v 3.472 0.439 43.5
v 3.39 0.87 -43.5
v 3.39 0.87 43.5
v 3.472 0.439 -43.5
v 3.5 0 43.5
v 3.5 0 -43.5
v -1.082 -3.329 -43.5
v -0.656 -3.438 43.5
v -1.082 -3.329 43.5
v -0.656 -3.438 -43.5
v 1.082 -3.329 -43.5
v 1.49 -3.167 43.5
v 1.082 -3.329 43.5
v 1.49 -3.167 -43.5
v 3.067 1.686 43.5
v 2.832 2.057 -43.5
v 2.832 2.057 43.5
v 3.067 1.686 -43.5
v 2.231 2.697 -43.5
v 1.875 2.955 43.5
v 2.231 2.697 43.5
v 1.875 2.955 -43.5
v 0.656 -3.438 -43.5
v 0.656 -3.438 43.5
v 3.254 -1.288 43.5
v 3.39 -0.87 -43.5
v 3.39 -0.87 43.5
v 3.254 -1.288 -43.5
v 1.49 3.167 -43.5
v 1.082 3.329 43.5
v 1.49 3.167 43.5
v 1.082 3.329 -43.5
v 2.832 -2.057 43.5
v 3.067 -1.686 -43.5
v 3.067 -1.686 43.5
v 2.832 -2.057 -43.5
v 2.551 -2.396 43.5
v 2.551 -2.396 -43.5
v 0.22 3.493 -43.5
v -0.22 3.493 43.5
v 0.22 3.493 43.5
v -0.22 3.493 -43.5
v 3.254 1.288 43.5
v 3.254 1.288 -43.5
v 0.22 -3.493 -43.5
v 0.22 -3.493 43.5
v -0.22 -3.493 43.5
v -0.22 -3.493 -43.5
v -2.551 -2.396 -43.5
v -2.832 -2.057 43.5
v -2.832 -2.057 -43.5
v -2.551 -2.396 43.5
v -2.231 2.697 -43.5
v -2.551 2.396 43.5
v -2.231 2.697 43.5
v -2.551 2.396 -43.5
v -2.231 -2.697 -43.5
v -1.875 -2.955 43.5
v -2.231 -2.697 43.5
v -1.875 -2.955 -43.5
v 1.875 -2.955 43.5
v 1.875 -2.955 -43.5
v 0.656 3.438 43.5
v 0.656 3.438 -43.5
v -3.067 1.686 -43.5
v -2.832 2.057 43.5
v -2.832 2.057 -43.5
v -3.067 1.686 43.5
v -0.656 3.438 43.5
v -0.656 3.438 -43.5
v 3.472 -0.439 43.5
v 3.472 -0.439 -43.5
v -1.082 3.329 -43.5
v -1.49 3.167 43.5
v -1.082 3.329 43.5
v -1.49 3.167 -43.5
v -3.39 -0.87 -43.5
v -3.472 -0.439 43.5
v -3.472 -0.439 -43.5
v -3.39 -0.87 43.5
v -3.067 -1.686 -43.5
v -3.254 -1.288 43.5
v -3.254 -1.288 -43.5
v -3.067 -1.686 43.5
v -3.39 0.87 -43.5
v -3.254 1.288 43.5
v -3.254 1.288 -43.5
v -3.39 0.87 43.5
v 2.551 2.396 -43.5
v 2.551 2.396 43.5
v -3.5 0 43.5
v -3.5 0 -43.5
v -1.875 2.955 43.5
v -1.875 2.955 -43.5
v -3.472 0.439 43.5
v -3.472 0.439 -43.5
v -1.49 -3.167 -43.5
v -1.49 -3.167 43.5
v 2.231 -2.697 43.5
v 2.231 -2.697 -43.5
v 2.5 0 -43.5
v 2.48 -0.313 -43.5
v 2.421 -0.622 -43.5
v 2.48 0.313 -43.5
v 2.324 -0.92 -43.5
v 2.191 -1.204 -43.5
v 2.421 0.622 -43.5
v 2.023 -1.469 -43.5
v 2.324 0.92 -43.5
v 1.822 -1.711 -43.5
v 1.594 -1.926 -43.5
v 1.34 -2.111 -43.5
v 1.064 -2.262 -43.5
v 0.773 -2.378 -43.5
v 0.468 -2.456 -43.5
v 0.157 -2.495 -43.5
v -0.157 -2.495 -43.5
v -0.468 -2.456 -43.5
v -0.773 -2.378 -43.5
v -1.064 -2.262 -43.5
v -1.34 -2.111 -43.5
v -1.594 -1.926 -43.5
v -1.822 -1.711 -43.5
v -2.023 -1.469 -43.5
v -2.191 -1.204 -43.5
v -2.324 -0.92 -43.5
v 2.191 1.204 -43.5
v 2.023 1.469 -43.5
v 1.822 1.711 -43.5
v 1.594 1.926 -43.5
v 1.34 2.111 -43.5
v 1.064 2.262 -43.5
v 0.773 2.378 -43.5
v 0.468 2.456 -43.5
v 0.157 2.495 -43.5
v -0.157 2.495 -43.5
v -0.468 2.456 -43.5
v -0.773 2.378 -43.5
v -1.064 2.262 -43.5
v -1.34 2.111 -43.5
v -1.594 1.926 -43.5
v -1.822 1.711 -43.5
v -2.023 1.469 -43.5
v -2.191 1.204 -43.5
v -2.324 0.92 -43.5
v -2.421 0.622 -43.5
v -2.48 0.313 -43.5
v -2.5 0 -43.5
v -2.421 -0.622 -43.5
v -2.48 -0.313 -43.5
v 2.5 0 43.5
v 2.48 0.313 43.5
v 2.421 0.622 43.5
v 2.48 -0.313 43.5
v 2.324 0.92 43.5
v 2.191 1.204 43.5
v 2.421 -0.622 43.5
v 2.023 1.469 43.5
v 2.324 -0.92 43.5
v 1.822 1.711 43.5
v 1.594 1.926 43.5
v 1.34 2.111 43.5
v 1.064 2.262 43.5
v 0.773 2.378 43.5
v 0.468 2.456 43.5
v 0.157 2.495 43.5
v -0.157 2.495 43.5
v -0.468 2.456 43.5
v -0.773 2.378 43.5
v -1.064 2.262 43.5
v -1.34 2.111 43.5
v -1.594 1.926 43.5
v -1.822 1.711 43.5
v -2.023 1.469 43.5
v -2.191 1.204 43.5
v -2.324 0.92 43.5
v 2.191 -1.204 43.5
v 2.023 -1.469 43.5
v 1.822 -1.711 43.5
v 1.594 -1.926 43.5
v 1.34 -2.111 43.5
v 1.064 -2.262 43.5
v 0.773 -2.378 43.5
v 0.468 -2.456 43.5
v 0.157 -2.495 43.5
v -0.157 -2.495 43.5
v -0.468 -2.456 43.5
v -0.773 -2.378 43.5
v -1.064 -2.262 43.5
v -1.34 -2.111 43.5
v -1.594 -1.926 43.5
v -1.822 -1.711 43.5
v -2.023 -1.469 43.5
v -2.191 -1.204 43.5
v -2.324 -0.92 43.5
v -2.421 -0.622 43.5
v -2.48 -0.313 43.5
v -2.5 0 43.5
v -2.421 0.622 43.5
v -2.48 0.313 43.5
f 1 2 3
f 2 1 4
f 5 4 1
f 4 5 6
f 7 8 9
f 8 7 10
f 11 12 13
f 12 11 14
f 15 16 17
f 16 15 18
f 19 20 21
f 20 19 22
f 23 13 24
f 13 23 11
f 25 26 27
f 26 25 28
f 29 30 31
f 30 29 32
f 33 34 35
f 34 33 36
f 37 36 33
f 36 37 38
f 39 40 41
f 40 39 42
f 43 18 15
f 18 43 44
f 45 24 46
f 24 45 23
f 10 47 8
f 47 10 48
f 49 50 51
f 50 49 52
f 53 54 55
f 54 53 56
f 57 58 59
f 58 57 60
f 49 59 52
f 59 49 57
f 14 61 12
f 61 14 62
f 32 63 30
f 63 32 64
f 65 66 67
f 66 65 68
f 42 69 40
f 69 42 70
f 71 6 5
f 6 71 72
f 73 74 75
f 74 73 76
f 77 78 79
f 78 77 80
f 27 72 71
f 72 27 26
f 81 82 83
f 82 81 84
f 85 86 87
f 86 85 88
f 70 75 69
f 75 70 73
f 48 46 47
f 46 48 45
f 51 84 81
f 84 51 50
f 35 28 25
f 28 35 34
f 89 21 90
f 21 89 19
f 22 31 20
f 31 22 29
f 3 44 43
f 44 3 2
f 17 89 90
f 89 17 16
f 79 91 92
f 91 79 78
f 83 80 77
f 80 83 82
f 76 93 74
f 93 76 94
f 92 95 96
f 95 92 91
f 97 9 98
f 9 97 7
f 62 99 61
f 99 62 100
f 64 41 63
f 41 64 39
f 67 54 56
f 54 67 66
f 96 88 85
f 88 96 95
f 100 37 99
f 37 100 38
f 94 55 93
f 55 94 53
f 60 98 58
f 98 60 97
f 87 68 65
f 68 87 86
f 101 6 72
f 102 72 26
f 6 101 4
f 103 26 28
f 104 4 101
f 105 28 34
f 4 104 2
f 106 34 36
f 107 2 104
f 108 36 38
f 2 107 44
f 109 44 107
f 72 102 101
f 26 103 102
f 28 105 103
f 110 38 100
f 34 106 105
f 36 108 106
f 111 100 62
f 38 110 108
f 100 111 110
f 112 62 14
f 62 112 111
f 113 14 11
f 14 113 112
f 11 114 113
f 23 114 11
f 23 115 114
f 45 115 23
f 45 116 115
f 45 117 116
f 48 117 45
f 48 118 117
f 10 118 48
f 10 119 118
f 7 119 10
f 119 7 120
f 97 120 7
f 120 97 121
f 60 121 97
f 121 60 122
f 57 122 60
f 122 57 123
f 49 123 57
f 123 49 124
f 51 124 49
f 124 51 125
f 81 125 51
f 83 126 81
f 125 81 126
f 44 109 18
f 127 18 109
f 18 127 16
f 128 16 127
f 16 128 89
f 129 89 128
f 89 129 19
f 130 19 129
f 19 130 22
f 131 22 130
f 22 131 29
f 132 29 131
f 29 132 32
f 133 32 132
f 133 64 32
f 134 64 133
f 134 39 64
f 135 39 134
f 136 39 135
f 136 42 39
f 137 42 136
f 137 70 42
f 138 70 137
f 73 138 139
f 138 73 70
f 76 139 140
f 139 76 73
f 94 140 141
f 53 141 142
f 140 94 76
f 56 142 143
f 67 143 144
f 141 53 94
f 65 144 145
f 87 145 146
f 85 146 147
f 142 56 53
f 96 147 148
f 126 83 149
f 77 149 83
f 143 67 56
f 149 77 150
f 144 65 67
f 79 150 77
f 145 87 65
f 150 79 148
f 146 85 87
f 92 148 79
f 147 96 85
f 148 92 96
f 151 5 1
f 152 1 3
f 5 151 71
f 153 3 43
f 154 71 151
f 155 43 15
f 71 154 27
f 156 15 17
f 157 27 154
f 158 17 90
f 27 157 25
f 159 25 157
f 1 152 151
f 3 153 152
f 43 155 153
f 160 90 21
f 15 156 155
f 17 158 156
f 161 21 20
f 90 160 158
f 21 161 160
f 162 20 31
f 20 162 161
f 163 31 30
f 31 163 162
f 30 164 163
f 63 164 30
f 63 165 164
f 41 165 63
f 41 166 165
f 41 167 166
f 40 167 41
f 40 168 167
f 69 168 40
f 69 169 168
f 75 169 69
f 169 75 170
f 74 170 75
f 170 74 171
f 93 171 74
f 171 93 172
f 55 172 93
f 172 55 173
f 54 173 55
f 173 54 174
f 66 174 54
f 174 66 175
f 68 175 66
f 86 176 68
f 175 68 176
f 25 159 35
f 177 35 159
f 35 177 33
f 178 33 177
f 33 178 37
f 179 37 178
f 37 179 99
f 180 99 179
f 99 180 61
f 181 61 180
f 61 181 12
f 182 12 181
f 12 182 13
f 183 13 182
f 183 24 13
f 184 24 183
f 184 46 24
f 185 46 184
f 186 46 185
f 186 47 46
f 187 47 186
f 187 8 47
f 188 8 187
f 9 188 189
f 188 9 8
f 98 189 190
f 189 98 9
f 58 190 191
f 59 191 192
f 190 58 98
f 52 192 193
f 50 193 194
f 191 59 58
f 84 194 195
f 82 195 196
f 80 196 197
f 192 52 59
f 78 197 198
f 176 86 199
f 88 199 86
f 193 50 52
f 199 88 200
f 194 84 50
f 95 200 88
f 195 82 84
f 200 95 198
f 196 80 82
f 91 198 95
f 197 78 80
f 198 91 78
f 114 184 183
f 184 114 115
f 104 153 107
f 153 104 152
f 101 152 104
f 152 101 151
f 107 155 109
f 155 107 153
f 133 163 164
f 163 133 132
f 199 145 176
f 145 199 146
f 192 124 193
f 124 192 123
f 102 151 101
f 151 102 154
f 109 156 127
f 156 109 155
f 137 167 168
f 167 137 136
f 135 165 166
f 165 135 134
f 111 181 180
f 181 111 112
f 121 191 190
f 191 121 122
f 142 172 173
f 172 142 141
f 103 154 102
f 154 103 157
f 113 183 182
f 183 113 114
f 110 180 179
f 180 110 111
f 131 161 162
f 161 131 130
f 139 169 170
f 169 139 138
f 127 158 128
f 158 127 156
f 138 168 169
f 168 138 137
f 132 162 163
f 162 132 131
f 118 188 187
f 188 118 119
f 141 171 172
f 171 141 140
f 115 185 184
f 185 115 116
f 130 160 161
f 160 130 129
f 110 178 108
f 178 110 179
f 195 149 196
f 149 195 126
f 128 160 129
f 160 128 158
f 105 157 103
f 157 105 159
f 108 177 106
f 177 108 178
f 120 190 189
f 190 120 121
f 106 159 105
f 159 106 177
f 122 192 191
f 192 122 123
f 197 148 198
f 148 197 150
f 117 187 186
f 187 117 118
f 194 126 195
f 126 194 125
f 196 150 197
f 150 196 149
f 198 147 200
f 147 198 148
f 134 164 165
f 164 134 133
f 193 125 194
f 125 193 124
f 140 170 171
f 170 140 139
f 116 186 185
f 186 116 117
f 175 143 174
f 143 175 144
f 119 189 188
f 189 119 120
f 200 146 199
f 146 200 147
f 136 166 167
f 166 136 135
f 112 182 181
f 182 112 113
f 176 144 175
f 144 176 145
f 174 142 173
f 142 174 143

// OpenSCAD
$fn = 50;


difference() {
	union() {
		translate(v = [0, 0, -43.5000000000]) {
			cylinder(h = 87, r = 3.5000000000);
		}
	}
	union() {
		translate(v = [0, 0, -100.0000000000]) {
			cylinder(h = 200, r = 2.5000000000);
		}
	}
}
